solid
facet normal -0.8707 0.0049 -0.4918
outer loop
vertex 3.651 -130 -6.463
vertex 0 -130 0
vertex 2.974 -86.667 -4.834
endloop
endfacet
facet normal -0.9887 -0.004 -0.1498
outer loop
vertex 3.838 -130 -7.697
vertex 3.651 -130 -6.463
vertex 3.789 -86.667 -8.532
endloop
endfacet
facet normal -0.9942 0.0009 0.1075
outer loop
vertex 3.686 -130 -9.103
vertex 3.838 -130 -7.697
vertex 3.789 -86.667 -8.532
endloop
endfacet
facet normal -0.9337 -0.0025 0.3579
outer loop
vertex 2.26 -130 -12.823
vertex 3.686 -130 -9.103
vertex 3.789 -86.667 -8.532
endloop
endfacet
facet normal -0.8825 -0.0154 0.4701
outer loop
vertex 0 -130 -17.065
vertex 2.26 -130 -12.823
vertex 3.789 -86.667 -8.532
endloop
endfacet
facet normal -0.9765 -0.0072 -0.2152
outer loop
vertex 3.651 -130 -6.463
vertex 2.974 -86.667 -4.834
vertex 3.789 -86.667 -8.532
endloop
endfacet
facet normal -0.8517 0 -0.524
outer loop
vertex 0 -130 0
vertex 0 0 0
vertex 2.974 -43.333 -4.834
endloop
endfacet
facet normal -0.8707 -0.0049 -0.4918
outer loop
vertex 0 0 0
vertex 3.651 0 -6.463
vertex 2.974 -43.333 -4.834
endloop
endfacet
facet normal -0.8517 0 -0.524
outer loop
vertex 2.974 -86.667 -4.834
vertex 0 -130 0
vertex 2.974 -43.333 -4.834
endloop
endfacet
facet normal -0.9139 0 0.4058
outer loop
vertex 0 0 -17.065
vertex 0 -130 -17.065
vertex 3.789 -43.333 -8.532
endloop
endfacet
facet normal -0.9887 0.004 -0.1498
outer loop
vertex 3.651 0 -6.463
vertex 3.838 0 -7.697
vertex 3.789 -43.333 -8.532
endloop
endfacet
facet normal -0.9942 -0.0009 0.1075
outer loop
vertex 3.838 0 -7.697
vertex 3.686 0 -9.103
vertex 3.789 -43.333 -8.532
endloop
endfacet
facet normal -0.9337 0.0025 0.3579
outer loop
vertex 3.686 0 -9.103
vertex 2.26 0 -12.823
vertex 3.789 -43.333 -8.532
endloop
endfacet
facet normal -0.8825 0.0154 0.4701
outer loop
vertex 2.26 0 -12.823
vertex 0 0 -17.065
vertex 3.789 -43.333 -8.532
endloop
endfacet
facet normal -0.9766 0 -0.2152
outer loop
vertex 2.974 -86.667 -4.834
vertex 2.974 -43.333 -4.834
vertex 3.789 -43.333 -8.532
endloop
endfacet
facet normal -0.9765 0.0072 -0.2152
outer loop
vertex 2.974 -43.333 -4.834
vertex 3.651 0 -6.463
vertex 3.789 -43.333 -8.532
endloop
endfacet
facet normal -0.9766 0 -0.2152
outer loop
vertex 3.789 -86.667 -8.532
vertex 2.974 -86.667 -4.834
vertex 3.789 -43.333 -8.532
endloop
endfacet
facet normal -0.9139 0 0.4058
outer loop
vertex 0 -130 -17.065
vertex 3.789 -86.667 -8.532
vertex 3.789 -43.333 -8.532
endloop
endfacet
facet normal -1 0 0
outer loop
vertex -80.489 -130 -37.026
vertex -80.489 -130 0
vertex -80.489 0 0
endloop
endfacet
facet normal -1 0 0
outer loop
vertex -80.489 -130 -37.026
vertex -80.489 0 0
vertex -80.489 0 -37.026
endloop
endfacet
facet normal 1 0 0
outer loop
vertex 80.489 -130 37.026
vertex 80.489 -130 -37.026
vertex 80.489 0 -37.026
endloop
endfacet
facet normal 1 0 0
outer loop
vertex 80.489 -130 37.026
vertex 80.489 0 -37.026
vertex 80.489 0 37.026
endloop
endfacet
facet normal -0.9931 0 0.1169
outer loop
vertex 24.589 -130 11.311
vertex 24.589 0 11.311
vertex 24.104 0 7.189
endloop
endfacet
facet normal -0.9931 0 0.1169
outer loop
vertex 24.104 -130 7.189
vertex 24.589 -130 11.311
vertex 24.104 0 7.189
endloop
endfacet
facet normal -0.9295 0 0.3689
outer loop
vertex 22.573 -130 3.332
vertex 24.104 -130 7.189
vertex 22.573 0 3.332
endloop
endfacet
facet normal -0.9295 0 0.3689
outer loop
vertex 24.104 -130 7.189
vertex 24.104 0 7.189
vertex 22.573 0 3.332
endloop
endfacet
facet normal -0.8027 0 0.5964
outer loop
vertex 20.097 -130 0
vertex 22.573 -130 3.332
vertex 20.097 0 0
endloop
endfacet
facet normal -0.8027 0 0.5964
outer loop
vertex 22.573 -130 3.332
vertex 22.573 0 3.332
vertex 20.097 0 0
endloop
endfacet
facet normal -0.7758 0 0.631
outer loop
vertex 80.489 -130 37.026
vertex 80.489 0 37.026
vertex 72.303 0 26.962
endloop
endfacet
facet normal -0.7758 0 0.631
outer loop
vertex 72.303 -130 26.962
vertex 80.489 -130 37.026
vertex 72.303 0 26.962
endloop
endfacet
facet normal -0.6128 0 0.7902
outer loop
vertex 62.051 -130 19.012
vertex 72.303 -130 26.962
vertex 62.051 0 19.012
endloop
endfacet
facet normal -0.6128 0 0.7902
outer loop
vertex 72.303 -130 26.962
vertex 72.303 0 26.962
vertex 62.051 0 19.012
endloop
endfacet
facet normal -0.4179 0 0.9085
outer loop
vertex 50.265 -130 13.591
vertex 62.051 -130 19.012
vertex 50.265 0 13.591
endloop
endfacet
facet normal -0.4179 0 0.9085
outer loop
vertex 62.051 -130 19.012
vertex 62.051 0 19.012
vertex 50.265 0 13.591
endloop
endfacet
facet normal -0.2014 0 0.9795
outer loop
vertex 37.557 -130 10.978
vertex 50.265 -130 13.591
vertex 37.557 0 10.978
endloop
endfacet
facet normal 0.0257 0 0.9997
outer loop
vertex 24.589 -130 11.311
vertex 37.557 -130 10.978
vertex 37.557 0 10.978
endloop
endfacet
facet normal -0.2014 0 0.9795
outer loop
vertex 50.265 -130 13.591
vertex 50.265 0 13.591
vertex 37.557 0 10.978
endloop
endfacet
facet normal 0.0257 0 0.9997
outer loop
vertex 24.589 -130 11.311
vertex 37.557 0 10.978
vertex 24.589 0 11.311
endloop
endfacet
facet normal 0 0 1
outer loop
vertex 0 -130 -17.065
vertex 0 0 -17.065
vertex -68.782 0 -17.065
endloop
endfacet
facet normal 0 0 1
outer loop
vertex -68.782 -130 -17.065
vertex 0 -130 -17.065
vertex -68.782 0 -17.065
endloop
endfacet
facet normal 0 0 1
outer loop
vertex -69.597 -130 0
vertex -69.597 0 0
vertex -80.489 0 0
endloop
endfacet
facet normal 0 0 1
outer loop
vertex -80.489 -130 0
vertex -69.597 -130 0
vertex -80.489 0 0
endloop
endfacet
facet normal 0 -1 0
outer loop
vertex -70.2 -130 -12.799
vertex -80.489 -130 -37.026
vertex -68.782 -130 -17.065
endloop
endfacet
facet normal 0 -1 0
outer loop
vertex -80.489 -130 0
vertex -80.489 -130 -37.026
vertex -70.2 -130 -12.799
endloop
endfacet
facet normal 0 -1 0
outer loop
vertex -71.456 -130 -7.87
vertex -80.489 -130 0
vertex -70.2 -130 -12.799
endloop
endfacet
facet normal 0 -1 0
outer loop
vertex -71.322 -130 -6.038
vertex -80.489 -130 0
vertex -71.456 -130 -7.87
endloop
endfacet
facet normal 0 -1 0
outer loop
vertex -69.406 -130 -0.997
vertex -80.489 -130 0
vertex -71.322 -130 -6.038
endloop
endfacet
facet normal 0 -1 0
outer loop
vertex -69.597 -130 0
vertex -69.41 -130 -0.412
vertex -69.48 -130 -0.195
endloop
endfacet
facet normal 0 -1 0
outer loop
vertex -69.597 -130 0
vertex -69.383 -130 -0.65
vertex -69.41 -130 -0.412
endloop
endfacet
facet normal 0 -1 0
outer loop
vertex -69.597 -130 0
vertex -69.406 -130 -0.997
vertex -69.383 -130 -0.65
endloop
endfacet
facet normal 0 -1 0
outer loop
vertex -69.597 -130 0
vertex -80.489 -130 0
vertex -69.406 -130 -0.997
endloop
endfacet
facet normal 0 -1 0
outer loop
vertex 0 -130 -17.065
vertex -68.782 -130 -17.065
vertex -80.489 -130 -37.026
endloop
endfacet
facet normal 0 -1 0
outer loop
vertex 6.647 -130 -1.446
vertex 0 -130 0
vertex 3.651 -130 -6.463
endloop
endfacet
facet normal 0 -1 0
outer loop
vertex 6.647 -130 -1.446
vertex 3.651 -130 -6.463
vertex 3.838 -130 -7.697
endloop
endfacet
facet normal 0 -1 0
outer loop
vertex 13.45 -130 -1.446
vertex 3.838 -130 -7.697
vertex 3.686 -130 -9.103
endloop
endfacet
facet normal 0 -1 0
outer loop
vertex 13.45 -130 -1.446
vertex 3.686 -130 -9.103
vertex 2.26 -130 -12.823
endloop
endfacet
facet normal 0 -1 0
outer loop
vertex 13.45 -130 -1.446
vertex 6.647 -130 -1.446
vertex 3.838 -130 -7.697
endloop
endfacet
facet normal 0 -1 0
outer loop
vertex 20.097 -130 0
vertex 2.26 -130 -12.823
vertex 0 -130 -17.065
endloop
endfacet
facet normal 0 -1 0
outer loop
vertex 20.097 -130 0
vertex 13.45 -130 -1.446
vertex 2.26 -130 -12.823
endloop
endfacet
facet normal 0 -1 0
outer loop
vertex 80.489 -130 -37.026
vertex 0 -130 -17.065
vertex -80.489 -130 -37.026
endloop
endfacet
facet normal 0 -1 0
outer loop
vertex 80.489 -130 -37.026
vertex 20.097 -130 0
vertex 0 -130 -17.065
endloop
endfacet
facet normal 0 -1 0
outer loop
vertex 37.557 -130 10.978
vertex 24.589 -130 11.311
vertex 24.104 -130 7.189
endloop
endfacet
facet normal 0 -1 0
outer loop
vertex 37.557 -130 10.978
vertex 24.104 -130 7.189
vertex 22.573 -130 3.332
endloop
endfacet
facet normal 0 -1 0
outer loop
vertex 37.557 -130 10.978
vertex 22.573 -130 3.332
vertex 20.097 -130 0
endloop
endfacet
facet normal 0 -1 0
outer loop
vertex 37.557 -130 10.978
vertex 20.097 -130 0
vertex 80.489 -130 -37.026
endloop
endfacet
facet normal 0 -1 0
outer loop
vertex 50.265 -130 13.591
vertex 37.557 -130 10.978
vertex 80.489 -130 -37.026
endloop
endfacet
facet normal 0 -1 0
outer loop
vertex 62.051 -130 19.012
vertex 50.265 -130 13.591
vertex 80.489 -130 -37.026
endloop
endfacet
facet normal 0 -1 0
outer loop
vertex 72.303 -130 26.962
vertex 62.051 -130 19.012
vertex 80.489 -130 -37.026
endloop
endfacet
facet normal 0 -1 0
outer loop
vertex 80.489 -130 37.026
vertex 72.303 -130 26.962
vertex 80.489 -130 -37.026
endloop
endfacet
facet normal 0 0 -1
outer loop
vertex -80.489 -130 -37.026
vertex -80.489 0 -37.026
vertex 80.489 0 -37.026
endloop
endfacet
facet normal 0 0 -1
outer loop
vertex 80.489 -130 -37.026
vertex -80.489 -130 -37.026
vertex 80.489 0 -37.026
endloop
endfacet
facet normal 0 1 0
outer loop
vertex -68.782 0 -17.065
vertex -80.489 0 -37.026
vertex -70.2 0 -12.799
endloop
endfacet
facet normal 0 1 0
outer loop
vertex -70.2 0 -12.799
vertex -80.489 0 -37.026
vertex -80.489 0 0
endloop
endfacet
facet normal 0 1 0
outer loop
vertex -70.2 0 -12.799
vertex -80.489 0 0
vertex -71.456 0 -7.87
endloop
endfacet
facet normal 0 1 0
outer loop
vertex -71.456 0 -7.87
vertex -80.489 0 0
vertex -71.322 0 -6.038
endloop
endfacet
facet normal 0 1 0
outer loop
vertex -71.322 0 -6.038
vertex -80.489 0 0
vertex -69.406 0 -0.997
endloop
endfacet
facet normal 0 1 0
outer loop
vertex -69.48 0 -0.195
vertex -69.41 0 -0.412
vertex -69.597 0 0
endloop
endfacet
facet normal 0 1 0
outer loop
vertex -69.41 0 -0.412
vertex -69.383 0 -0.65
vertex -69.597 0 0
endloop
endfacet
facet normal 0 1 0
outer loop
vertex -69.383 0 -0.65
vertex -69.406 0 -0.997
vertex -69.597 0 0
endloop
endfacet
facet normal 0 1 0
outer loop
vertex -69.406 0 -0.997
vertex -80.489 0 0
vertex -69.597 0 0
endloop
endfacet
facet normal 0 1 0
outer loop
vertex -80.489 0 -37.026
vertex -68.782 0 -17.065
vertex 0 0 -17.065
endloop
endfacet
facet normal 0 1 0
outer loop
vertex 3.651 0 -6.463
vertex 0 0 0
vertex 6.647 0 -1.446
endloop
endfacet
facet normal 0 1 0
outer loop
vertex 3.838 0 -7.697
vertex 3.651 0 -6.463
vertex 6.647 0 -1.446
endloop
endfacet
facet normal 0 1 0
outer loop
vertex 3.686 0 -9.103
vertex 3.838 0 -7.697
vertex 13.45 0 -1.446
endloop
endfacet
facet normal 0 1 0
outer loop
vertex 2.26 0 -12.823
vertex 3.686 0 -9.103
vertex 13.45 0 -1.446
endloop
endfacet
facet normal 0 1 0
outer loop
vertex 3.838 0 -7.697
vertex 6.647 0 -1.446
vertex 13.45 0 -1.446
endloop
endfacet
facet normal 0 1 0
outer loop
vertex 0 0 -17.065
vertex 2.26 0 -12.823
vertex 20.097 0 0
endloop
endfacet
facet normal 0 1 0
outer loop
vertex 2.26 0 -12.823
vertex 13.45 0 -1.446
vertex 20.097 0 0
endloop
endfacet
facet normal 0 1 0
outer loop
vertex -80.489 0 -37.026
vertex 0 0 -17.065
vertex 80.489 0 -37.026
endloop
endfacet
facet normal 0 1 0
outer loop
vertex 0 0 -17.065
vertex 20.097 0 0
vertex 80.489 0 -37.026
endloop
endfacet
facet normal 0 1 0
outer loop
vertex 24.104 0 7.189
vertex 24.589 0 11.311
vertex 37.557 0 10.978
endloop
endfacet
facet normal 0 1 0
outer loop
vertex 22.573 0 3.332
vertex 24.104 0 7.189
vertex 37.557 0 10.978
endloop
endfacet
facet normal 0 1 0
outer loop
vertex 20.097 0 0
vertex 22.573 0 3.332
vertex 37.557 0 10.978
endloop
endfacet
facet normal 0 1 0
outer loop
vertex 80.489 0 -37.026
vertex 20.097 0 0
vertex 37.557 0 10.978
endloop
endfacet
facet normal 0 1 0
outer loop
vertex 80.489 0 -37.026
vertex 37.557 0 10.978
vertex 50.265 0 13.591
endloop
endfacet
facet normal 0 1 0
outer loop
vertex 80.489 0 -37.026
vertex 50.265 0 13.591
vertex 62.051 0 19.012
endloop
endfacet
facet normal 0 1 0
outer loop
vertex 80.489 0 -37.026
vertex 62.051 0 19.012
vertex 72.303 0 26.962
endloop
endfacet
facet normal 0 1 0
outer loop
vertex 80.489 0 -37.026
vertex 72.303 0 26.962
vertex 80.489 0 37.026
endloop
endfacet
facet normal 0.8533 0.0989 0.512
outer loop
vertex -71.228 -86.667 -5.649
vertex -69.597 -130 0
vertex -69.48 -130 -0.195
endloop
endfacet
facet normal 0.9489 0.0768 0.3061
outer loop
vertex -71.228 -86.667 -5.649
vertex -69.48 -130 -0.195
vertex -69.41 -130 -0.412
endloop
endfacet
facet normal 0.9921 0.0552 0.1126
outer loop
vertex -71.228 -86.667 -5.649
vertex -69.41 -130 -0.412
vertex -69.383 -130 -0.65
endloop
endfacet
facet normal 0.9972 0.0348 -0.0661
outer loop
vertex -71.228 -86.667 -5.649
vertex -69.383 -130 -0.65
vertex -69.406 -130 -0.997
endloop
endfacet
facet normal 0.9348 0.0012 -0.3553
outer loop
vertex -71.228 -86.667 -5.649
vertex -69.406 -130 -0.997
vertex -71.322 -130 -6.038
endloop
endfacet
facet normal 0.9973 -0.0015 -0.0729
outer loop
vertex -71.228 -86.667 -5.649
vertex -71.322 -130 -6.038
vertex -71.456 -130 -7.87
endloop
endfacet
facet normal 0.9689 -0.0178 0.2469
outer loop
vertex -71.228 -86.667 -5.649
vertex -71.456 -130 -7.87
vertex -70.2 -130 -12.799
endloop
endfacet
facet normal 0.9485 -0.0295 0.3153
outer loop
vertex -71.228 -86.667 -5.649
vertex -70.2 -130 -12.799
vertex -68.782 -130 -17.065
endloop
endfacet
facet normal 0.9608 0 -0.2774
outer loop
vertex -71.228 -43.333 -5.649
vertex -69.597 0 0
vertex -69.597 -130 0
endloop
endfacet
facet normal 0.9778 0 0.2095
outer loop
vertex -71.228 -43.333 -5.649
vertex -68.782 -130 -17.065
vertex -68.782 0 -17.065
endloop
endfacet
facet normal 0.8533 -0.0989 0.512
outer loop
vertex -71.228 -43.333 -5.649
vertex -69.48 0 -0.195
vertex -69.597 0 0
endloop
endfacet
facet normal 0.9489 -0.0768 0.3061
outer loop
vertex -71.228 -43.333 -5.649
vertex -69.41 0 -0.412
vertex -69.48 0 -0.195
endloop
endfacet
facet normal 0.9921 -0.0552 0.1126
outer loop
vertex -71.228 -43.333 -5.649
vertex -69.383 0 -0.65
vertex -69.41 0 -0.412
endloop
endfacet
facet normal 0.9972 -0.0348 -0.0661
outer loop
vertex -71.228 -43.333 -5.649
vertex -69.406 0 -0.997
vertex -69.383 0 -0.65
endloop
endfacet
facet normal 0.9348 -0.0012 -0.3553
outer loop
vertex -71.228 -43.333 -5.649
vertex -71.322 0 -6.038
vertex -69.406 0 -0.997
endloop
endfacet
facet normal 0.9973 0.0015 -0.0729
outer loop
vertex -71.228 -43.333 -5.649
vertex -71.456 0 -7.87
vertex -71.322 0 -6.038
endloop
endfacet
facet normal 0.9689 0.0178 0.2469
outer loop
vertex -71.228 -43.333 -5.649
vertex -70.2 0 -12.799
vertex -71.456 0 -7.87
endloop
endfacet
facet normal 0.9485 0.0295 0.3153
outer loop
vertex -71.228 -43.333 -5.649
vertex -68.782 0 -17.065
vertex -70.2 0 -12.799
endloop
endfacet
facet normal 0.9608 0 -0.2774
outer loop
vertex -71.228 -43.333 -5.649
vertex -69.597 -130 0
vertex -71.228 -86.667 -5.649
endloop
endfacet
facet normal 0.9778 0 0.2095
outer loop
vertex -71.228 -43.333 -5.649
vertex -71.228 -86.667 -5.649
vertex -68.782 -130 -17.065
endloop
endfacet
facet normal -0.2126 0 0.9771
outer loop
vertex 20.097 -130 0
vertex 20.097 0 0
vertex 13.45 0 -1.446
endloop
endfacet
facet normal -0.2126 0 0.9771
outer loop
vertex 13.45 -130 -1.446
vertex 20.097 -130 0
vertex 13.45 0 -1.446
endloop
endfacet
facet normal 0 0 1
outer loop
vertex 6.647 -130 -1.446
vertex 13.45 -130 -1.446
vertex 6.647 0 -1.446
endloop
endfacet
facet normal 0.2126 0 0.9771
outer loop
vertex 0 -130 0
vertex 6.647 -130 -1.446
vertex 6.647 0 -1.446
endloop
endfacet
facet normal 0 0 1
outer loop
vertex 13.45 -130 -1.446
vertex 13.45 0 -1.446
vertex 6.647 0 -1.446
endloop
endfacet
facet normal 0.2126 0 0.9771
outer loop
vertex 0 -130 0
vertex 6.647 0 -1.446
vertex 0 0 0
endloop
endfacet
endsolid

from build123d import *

# Parameters (mm, degrees)
F1_DEPTH = 130


with BuildPart() as f1:
    # F0 (on Front) → F1 (new body)
    with BuildSketch(Plane.XZ):
        with BuildLine():
            Line((-80.4885666445, 0), (-80.4885666445, -37.026398866))
            Line((-80.4885666445, -37.026398866), (80.4885666445, -37.026398866))
            Line((80.4885666445, -37.026398866), (80.4885666445, 37.026398866))
            ThreePointArc((80.4885666445, 37.026398866), (56.312606492, 15.964739969), (24.5885544515, 11.3112416162))
            ThreePointArc((24.5885544515, 11.3112416162), (23.4644064233, 5.2103284523), (20.0973115861, 0))
            ThreePointArc((20.0973115861, 0), (10.0486557931, -1.628361225), (0, 0))
            add(Edge.make_bspline(
                [(0, 0), (1.1070352702, -1.6801785988), (3.1184613885, -4.7329766513), (4.5940239288, -8.7749202813), (1.7421748157, -13.92092092), (0, -17.0645769686)],
                knots=[0, 0, 0, 0, 0.3226277316, 0.5861979859, 1, 1, 1, 1], degree=3))
            Line((0, -17.0645769686), (-68.7817037106, -17.0645769686))
            add(Edge.make_bspline(
                [(-69.5971027017, 0), (-68.7549732227, -1.0893751099), (-72.5978419161, -5.9254448151), (-70.4120398181, -12.0907470214), (-69.2717425761, -15.6012676406), (-68.7817037106, -17.0645769686)],
                knots=[0.3125236167, 0.3125236167, 0.3125236167, 0.3125236167, 0.5421460101, 0.7849492257, 1, 1, 1, 1], degree=3))
            Line((-69.5971027017, 0), (-80.4885666445, 0))
        make_face()
    extrude(amount=F1_DEPTH)


solid = f1.part
